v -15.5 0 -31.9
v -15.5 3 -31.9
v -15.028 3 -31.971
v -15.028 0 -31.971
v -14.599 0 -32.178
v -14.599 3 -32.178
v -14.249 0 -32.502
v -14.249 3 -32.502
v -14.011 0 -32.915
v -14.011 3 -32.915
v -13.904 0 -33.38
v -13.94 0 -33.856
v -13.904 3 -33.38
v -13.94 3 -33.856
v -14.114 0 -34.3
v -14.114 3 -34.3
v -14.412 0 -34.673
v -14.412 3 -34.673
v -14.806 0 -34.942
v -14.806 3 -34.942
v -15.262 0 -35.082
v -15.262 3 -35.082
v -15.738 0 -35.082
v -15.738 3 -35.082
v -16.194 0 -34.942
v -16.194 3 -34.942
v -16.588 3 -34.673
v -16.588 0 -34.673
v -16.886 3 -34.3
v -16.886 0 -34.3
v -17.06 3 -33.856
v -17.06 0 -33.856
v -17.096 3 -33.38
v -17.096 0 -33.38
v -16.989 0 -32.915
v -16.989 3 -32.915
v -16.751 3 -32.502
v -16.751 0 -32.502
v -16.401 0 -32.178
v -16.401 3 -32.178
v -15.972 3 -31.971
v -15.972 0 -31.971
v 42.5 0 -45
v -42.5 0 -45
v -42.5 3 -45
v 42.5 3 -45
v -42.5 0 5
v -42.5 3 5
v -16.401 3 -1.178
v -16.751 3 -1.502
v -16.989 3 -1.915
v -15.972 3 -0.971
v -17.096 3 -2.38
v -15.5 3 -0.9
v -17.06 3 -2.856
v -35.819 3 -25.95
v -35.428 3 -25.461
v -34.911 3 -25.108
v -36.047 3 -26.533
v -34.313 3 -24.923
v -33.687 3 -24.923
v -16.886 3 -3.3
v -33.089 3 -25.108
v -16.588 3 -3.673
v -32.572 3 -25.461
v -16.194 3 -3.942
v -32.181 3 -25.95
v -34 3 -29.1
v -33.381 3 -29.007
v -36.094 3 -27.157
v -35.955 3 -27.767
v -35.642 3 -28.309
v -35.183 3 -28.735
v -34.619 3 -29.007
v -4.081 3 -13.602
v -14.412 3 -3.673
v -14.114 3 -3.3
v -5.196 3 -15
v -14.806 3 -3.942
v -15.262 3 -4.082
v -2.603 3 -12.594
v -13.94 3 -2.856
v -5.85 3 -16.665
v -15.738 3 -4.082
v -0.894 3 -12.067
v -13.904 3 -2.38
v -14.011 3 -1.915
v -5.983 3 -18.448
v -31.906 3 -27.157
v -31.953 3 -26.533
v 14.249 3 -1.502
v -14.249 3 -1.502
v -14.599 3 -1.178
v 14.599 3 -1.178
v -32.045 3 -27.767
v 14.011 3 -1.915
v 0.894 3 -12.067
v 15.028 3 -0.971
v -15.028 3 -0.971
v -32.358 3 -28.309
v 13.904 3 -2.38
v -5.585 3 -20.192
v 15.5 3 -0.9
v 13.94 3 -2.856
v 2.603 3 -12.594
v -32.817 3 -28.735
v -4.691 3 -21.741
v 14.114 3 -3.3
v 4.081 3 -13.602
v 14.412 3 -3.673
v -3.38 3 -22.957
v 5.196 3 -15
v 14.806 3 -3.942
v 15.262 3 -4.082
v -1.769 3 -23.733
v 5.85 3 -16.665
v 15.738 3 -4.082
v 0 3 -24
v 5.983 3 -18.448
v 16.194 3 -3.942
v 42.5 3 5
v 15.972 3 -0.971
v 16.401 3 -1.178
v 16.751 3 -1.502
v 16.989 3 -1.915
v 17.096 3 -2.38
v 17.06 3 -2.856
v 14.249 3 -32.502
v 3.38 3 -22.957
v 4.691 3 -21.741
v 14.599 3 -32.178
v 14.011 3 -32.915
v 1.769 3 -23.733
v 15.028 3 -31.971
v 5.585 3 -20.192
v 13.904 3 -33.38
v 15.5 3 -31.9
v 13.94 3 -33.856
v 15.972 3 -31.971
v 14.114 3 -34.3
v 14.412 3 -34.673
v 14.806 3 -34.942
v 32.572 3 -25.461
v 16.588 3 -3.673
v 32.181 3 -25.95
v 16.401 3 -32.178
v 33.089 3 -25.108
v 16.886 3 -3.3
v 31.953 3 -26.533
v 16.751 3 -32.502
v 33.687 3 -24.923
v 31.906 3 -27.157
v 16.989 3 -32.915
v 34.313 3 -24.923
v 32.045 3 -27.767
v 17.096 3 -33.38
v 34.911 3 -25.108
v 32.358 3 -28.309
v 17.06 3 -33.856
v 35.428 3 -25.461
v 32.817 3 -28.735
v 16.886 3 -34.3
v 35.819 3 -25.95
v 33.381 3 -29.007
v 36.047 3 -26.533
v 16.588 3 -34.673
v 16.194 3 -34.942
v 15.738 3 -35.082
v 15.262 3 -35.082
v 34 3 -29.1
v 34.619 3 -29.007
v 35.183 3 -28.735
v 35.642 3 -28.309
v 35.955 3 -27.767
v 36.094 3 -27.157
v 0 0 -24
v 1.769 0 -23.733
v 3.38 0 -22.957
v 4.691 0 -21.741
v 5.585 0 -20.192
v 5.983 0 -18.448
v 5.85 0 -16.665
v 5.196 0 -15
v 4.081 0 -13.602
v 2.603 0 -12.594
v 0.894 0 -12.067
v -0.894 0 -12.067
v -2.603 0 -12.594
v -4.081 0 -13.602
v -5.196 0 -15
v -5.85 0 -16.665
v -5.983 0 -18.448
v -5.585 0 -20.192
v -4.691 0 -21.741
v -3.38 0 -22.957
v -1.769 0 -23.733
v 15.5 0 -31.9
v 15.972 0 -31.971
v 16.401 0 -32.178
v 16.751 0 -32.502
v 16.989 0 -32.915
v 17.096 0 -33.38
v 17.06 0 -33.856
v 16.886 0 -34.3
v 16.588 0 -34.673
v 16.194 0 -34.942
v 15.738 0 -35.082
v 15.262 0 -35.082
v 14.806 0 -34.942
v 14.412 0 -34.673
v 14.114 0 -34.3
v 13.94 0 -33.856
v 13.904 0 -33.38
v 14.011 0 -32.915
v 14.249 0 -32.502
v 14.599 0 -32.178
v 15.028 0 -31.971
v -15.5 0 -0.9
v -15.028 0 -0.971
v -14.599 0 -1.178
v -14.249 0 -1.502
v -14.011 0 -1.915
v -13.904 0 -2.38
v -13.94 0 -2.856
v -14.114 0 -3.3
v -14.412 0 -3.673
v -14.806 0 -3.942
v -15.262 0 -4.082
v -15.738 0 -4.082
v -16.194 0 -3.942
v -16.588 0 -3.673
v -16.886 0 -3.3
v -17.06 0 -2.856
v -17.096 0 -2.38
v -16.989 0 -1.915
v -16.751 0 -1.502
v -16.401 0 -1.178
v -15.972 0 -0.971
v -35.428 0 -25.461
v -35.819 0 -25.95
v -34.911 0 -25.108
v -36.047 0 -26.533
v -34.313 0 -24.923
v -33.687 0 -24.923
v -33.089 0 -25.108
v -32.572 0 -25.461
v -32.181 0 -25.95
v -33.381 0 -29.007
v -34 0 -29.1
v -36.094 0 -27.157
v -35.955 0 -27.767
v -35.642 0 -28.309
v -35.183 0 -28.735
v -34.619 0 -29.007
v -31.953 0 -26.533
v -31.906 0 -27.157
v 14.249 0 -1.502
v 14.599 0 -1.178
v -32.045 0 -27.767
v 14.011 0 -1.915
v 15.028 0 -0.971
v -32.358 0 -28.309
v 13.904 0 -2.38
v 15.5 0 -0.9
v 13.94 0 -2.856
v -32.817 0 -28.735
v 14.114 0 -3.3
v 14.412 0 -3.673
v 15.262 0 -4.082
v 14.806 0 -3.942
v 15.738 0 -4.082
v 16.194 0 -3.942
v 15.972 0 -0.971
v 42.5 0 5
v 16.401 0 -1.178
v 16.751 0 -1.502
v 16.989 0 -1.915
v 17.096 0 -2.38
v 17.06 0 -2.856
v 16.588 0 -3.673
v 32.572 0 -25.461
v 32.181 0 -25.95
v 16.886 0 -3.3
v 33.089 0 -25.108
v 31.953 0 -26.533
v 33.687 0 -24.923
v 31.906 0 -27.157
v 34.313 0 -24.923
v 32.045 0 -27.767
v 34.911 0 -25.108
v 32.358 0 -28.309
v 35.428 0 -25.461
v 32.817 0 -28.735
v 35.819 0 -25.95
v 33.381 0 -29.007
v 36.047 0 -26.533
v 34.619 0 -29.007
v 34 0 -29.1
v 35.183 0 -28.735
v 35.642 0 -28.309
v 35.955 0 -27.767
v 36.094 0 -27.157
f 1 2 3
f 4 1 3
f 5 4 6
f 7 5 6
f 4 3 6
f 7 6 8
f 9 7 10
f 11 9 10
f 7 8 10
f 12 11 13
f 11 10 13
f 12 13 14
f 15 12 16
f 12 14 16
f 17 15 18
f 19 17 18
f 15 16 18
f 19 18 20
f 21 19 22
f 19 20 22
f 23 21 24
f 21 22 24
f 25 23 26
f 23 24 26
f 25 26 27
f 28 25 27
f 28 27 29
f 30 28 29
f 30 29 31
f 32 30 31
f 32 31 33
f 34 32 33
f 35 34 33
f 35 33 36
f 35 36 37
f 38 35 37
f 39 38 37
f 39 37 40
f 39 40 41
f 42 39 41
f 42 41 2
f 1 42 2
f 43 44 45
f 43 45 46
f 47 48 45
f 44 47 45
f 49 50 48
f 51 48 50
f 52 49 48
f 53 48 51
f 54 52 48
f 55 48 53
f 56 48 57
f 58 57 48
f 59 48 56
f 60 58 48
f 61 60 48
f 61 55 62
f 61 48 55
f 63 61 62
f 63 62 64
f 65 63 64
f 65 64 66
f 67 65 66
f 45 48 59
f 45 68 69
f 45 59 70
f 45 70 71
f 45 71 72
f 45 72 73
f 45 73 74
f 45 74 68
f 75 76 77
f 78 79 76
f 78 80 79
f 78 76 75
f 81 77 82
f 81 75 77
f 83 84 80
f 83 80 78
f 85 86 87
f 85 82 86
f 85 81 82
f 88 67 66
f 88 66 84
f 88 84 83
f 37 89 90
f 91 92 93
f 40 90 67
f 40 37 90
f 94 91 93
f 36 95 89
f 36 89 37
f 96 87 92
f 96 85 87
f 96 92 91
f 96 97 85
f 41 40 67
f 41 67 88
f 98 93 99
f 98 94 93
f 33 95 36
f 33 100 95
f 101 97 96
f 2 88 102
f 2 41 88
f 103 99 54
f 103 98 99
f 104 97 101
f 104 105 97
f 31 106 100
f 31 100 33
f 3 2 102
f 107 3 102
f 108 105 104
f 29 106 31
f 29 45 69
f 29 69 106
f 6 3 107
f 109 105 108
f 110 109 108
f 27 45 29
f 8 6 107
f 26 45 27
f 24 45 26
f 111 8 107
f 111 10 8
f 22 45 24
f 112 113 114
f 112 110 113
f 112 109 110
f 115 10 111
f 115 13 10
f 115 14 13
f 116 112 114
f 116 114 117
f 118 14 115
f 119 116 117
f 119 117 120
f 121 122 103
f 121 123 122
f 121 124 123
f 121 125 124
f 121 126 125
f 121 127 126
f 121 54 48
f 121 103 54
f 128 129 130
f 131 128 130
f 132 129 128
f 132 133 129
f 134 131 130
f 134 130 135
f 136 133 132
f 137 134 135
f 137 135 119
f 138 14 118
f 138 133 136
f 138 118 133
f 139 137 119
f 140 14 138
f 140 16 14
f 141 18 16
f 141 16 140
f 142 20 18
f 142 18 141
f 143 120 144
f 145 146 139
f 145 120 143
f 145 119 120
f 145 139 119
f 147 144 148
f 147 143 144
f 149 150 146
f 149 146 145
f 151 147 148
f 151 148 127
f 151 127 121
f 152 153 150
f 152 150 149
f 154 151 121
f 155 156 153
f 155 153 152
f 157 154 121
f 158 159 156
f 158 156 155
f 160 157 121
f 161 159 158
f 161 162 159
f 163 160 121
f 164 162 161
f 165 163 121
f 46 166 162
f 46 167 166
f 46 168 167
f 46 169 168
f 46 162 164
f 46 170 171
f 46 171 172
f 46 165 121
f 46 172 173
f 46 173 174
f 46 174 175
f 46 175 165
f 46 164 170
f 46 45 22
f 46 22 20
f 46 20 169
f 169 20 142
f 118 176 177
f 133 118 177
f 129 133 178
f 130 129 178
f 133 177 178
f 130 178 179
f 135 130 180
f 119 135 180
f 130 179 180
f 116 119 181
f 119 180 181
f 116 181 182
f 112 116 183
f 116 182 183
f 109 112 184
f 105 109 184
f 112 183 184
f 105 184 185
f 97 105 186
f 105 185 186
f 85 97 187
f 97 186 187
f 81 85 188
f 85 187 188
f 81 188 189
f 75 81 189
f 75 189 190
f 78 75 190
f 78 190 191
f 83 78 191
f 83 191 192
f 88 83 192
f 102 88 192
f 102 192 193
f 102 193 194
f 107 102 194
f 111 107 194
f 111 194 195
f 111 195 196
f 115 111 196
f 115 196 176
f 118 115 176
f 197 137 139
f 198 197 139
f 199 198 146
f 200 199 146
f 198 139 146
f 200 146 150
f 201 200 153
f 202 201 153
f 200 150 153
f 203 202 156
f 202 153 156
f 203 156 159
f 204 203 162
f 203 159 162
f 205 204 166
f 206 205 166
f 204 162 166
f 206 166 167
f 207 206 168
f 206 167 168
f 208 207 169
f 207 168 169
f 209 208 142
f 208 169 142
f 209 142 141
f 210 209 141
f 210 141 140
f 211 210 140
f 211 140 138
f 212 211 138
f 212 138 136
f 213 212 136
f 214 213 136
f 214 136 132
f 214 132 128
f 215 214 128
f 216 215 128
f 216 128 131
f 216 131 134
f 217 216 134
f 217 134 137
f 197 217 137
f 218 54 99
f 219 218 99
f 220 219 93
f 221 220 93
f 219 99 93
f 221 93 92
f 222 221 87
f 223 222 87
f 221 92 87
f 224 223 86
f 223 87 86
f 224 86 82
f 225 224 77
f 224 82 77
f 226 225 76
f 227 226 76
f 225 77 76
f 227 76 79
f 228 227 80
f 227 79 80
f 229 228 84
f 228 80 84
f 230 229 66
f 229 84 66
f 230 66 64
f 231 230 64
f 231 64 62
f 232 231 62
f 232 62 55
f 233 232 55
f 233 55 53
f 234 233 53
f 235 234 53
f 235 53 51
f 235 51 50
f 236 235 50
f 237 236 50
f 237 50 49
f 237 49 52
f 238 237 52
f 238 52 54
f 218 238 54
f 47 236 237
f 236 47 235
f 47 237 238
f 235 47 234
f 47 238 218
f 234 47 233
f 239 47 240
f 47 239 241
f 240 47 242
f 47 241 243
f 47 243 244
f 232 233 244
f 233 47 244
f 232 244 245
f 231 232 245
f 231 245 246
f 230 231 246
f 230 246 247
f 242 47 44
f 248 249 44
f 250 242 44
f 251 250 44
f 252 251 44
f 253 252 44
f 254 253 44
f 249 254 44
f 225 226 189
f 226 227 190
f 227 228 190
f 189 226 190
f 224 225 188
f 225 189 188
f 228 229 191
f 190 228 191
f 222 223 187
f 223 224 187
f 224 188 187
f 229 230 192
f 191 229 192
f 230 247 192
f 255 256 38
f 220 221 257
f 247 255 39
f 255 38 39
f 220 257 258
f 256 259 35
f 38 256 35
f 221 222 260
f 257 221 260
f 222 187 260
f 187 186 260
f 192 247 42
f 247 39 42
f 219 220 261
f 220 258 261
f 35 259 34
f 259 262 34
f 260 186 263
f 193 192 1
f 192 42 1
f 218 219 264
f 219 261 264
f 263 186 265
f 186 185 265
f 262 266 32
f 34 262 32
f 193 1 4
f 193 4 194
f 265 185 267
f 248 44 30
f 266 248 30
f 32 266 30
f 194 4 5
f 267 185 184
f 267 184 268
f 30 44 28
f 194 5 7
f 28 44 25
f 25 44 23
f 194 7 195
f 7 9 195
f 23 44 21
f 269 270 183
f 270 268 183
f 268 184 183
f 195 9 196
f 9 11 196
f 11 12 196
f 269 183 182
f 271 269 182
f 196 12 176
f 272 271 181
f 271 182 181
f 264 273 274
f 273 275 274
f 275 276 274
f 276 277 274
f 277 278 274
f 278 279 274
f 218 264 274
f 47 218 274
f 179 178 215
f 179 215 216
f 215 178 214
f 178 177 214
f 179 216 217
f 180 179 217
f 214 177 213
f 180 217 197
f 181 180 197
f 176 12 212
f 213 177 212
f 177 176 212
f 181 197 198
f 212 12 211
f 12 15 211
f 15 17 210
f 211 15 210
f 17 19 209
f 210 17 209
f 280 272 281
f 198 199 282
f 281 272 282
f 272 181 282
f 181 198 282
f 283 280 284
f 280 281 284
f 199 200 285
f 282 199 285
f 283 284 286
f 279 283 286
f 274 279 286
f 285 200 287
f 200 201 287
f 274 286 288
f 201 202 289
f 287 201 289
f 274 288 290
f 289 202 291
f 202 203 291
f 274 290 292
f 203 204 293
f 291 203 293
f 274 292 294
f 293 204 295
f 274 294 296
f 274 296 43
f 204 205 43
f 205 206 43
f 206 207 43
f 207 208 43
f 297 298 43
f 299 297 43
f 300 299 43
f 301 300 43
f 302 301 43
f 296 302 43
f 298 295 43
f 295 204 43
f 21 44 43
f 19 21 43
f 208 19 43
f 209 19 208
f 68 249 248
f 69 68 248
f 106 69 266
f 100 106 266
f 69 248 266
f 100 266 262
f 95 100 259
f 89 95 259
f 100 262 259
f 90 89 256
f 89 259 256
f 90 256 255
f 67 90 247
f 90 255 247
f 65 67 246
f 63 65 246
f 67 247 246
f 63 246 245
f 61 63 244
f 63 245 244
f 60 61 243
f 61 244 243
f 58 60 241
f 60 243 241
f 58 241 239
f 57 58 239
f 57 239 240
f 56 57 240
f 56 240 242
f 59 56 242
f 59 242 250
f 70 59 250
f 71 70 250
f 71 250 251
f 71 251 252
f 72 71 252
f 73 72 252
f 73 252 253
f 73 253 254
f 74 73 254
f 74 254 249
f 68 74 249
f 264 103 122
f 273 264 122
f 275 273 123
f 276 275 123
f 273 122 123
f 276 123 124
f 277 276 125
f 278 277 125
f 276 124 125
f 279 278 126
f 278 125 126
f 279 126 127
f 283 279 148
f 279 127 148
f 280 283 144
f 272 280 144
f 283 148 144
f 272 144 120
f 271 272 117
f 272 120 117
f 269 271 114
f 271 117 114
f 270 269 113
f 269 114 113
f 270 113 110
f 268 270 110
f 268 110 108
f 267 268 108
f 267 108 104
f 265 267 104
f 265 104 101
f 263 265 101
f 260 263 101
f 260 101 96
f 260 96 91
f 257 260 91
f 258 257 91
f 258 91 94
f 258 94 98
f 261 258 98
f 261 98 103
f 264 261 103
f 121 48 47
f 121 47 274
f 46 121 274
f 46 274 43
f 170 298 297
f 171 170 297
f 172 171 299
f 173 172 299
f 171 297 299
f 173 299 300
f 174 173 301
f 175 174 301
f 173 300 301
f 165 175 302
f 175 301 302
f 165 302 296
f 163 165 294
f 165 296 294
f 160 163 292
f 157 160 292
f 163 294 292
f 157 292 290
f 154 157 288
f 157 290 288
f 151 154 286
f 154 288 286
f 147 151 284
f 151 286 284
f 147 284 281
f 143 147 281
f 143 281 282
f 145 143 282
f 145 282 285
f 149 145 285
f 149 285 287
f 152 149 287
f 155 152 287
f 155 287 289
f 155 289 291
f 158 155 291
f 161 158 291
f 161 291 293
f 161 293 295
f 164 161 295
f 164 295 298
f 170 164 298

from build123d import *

# Parameters (mm, degrees)
SKETCH1_W           = 130
SKETCH1_H           = 90
BOSS_EXTRUDE1_DEPTH = 3
SKETCH2_R           = 1.6
CUT_EXTRUDE1_DEPTH  = 10
SKETCH3_R           = 2.1
CUT_EXTRUDE2_DEPTH  = 10
SKETCH4_R           = 6
CUT_EXTRUDE3_DEPTH  = 10
SKETCH5_W           = 211.899285322
SKETCH5_H           = 138.032985156
SKETCH5_W_2         = 85
SKETCH5_H_2         = 50
CUT_EXTRUDE4_DEPTH  = 10


with BuildPart() as part:
    # Sketch1 → Boss-Extrude1 (new body)
    with BuildSketch(Plane(origin=(0, 0, 0), x_dir=(1, 0, 0), z_dir=(0, 1, 0))):
        Rectangle(SKETCH1_W, SKETCH1_H)
    extrude(amount=BOSS_EXTRUDE1_DEPTH)

    # Sketch2 → Cut-Extrude1 (cut)
    with BuildSketch(Plane(origin=(0, 3, 0), x_dir=(1, 0, 0), z_dir=(0, 1, 0))):
        with Locations(Location((15.5, 2.5, 0), (0, 0, 270))):
            Circle(SKETCH2_R)
        with Locations(Location((-15.5, 2.5, 0), (0, 0, 270))):
            Circle(SKETCH2_R)
        with Locations(Location((-15.5, 33.5, 0), (0, 0, 270))):
            Circle(SKETCH2_R)
        with Locations(Location((15.5, 33.5, 0), (0, 0, 270))):
            Circle(SKETCH2_R)
    extrude(amount=-CUT_EXTRUDE1_DEPTH, mode=Mode.SUBTRACT)

    # Sketch3 → Cut-Extrude2 (cut)
    with BuildSketch(Plane.XZ):
        with Locations(Location((-34, -27, 0), (0, 0, 270))):
            Circle(SKETCH3_R)
        with Locations(Location((34, -27, 0), (0, 0, 270))):
            Circle(SKETCH3_R)
    extrude(amount=-CUT_EXTRUDE2_DEPTH, mode=Mode.SUBTRACT)

    # Sketch4 → Cut-Extrude3 (cut)
    with BuildSketch(Plane.XZ):
        with Locations(Location((0, -18, 0), (0, 0, 270))):
            Circle(SKETCH4_R)
    extrude(amount=-CUT_EXTRUDE3_DEPTH, mode=Mode.SUBTRACT)

    # Sketch5 → Cut-Extrude4 (cut)
    with BuildSketch(Plane(origin=(0, 3, 0), x_dir=(1, 0, 0), z_dir=(0, 1, 0))):
        with Locations((0.497416163, -6.590764156)):
            Rectangle(SKETCH5_W, SKETCH5_H)
        with Locations((0, 20)):
            Rectangle(SKETCH5_W_2, SKETCH5_H_2, mode=Mode.SUBTRACT)
    extrude(amount=-CUT_EXTRUDE4_DEPTH, mode=Mode.SUBTRACT)


solid = part.part
